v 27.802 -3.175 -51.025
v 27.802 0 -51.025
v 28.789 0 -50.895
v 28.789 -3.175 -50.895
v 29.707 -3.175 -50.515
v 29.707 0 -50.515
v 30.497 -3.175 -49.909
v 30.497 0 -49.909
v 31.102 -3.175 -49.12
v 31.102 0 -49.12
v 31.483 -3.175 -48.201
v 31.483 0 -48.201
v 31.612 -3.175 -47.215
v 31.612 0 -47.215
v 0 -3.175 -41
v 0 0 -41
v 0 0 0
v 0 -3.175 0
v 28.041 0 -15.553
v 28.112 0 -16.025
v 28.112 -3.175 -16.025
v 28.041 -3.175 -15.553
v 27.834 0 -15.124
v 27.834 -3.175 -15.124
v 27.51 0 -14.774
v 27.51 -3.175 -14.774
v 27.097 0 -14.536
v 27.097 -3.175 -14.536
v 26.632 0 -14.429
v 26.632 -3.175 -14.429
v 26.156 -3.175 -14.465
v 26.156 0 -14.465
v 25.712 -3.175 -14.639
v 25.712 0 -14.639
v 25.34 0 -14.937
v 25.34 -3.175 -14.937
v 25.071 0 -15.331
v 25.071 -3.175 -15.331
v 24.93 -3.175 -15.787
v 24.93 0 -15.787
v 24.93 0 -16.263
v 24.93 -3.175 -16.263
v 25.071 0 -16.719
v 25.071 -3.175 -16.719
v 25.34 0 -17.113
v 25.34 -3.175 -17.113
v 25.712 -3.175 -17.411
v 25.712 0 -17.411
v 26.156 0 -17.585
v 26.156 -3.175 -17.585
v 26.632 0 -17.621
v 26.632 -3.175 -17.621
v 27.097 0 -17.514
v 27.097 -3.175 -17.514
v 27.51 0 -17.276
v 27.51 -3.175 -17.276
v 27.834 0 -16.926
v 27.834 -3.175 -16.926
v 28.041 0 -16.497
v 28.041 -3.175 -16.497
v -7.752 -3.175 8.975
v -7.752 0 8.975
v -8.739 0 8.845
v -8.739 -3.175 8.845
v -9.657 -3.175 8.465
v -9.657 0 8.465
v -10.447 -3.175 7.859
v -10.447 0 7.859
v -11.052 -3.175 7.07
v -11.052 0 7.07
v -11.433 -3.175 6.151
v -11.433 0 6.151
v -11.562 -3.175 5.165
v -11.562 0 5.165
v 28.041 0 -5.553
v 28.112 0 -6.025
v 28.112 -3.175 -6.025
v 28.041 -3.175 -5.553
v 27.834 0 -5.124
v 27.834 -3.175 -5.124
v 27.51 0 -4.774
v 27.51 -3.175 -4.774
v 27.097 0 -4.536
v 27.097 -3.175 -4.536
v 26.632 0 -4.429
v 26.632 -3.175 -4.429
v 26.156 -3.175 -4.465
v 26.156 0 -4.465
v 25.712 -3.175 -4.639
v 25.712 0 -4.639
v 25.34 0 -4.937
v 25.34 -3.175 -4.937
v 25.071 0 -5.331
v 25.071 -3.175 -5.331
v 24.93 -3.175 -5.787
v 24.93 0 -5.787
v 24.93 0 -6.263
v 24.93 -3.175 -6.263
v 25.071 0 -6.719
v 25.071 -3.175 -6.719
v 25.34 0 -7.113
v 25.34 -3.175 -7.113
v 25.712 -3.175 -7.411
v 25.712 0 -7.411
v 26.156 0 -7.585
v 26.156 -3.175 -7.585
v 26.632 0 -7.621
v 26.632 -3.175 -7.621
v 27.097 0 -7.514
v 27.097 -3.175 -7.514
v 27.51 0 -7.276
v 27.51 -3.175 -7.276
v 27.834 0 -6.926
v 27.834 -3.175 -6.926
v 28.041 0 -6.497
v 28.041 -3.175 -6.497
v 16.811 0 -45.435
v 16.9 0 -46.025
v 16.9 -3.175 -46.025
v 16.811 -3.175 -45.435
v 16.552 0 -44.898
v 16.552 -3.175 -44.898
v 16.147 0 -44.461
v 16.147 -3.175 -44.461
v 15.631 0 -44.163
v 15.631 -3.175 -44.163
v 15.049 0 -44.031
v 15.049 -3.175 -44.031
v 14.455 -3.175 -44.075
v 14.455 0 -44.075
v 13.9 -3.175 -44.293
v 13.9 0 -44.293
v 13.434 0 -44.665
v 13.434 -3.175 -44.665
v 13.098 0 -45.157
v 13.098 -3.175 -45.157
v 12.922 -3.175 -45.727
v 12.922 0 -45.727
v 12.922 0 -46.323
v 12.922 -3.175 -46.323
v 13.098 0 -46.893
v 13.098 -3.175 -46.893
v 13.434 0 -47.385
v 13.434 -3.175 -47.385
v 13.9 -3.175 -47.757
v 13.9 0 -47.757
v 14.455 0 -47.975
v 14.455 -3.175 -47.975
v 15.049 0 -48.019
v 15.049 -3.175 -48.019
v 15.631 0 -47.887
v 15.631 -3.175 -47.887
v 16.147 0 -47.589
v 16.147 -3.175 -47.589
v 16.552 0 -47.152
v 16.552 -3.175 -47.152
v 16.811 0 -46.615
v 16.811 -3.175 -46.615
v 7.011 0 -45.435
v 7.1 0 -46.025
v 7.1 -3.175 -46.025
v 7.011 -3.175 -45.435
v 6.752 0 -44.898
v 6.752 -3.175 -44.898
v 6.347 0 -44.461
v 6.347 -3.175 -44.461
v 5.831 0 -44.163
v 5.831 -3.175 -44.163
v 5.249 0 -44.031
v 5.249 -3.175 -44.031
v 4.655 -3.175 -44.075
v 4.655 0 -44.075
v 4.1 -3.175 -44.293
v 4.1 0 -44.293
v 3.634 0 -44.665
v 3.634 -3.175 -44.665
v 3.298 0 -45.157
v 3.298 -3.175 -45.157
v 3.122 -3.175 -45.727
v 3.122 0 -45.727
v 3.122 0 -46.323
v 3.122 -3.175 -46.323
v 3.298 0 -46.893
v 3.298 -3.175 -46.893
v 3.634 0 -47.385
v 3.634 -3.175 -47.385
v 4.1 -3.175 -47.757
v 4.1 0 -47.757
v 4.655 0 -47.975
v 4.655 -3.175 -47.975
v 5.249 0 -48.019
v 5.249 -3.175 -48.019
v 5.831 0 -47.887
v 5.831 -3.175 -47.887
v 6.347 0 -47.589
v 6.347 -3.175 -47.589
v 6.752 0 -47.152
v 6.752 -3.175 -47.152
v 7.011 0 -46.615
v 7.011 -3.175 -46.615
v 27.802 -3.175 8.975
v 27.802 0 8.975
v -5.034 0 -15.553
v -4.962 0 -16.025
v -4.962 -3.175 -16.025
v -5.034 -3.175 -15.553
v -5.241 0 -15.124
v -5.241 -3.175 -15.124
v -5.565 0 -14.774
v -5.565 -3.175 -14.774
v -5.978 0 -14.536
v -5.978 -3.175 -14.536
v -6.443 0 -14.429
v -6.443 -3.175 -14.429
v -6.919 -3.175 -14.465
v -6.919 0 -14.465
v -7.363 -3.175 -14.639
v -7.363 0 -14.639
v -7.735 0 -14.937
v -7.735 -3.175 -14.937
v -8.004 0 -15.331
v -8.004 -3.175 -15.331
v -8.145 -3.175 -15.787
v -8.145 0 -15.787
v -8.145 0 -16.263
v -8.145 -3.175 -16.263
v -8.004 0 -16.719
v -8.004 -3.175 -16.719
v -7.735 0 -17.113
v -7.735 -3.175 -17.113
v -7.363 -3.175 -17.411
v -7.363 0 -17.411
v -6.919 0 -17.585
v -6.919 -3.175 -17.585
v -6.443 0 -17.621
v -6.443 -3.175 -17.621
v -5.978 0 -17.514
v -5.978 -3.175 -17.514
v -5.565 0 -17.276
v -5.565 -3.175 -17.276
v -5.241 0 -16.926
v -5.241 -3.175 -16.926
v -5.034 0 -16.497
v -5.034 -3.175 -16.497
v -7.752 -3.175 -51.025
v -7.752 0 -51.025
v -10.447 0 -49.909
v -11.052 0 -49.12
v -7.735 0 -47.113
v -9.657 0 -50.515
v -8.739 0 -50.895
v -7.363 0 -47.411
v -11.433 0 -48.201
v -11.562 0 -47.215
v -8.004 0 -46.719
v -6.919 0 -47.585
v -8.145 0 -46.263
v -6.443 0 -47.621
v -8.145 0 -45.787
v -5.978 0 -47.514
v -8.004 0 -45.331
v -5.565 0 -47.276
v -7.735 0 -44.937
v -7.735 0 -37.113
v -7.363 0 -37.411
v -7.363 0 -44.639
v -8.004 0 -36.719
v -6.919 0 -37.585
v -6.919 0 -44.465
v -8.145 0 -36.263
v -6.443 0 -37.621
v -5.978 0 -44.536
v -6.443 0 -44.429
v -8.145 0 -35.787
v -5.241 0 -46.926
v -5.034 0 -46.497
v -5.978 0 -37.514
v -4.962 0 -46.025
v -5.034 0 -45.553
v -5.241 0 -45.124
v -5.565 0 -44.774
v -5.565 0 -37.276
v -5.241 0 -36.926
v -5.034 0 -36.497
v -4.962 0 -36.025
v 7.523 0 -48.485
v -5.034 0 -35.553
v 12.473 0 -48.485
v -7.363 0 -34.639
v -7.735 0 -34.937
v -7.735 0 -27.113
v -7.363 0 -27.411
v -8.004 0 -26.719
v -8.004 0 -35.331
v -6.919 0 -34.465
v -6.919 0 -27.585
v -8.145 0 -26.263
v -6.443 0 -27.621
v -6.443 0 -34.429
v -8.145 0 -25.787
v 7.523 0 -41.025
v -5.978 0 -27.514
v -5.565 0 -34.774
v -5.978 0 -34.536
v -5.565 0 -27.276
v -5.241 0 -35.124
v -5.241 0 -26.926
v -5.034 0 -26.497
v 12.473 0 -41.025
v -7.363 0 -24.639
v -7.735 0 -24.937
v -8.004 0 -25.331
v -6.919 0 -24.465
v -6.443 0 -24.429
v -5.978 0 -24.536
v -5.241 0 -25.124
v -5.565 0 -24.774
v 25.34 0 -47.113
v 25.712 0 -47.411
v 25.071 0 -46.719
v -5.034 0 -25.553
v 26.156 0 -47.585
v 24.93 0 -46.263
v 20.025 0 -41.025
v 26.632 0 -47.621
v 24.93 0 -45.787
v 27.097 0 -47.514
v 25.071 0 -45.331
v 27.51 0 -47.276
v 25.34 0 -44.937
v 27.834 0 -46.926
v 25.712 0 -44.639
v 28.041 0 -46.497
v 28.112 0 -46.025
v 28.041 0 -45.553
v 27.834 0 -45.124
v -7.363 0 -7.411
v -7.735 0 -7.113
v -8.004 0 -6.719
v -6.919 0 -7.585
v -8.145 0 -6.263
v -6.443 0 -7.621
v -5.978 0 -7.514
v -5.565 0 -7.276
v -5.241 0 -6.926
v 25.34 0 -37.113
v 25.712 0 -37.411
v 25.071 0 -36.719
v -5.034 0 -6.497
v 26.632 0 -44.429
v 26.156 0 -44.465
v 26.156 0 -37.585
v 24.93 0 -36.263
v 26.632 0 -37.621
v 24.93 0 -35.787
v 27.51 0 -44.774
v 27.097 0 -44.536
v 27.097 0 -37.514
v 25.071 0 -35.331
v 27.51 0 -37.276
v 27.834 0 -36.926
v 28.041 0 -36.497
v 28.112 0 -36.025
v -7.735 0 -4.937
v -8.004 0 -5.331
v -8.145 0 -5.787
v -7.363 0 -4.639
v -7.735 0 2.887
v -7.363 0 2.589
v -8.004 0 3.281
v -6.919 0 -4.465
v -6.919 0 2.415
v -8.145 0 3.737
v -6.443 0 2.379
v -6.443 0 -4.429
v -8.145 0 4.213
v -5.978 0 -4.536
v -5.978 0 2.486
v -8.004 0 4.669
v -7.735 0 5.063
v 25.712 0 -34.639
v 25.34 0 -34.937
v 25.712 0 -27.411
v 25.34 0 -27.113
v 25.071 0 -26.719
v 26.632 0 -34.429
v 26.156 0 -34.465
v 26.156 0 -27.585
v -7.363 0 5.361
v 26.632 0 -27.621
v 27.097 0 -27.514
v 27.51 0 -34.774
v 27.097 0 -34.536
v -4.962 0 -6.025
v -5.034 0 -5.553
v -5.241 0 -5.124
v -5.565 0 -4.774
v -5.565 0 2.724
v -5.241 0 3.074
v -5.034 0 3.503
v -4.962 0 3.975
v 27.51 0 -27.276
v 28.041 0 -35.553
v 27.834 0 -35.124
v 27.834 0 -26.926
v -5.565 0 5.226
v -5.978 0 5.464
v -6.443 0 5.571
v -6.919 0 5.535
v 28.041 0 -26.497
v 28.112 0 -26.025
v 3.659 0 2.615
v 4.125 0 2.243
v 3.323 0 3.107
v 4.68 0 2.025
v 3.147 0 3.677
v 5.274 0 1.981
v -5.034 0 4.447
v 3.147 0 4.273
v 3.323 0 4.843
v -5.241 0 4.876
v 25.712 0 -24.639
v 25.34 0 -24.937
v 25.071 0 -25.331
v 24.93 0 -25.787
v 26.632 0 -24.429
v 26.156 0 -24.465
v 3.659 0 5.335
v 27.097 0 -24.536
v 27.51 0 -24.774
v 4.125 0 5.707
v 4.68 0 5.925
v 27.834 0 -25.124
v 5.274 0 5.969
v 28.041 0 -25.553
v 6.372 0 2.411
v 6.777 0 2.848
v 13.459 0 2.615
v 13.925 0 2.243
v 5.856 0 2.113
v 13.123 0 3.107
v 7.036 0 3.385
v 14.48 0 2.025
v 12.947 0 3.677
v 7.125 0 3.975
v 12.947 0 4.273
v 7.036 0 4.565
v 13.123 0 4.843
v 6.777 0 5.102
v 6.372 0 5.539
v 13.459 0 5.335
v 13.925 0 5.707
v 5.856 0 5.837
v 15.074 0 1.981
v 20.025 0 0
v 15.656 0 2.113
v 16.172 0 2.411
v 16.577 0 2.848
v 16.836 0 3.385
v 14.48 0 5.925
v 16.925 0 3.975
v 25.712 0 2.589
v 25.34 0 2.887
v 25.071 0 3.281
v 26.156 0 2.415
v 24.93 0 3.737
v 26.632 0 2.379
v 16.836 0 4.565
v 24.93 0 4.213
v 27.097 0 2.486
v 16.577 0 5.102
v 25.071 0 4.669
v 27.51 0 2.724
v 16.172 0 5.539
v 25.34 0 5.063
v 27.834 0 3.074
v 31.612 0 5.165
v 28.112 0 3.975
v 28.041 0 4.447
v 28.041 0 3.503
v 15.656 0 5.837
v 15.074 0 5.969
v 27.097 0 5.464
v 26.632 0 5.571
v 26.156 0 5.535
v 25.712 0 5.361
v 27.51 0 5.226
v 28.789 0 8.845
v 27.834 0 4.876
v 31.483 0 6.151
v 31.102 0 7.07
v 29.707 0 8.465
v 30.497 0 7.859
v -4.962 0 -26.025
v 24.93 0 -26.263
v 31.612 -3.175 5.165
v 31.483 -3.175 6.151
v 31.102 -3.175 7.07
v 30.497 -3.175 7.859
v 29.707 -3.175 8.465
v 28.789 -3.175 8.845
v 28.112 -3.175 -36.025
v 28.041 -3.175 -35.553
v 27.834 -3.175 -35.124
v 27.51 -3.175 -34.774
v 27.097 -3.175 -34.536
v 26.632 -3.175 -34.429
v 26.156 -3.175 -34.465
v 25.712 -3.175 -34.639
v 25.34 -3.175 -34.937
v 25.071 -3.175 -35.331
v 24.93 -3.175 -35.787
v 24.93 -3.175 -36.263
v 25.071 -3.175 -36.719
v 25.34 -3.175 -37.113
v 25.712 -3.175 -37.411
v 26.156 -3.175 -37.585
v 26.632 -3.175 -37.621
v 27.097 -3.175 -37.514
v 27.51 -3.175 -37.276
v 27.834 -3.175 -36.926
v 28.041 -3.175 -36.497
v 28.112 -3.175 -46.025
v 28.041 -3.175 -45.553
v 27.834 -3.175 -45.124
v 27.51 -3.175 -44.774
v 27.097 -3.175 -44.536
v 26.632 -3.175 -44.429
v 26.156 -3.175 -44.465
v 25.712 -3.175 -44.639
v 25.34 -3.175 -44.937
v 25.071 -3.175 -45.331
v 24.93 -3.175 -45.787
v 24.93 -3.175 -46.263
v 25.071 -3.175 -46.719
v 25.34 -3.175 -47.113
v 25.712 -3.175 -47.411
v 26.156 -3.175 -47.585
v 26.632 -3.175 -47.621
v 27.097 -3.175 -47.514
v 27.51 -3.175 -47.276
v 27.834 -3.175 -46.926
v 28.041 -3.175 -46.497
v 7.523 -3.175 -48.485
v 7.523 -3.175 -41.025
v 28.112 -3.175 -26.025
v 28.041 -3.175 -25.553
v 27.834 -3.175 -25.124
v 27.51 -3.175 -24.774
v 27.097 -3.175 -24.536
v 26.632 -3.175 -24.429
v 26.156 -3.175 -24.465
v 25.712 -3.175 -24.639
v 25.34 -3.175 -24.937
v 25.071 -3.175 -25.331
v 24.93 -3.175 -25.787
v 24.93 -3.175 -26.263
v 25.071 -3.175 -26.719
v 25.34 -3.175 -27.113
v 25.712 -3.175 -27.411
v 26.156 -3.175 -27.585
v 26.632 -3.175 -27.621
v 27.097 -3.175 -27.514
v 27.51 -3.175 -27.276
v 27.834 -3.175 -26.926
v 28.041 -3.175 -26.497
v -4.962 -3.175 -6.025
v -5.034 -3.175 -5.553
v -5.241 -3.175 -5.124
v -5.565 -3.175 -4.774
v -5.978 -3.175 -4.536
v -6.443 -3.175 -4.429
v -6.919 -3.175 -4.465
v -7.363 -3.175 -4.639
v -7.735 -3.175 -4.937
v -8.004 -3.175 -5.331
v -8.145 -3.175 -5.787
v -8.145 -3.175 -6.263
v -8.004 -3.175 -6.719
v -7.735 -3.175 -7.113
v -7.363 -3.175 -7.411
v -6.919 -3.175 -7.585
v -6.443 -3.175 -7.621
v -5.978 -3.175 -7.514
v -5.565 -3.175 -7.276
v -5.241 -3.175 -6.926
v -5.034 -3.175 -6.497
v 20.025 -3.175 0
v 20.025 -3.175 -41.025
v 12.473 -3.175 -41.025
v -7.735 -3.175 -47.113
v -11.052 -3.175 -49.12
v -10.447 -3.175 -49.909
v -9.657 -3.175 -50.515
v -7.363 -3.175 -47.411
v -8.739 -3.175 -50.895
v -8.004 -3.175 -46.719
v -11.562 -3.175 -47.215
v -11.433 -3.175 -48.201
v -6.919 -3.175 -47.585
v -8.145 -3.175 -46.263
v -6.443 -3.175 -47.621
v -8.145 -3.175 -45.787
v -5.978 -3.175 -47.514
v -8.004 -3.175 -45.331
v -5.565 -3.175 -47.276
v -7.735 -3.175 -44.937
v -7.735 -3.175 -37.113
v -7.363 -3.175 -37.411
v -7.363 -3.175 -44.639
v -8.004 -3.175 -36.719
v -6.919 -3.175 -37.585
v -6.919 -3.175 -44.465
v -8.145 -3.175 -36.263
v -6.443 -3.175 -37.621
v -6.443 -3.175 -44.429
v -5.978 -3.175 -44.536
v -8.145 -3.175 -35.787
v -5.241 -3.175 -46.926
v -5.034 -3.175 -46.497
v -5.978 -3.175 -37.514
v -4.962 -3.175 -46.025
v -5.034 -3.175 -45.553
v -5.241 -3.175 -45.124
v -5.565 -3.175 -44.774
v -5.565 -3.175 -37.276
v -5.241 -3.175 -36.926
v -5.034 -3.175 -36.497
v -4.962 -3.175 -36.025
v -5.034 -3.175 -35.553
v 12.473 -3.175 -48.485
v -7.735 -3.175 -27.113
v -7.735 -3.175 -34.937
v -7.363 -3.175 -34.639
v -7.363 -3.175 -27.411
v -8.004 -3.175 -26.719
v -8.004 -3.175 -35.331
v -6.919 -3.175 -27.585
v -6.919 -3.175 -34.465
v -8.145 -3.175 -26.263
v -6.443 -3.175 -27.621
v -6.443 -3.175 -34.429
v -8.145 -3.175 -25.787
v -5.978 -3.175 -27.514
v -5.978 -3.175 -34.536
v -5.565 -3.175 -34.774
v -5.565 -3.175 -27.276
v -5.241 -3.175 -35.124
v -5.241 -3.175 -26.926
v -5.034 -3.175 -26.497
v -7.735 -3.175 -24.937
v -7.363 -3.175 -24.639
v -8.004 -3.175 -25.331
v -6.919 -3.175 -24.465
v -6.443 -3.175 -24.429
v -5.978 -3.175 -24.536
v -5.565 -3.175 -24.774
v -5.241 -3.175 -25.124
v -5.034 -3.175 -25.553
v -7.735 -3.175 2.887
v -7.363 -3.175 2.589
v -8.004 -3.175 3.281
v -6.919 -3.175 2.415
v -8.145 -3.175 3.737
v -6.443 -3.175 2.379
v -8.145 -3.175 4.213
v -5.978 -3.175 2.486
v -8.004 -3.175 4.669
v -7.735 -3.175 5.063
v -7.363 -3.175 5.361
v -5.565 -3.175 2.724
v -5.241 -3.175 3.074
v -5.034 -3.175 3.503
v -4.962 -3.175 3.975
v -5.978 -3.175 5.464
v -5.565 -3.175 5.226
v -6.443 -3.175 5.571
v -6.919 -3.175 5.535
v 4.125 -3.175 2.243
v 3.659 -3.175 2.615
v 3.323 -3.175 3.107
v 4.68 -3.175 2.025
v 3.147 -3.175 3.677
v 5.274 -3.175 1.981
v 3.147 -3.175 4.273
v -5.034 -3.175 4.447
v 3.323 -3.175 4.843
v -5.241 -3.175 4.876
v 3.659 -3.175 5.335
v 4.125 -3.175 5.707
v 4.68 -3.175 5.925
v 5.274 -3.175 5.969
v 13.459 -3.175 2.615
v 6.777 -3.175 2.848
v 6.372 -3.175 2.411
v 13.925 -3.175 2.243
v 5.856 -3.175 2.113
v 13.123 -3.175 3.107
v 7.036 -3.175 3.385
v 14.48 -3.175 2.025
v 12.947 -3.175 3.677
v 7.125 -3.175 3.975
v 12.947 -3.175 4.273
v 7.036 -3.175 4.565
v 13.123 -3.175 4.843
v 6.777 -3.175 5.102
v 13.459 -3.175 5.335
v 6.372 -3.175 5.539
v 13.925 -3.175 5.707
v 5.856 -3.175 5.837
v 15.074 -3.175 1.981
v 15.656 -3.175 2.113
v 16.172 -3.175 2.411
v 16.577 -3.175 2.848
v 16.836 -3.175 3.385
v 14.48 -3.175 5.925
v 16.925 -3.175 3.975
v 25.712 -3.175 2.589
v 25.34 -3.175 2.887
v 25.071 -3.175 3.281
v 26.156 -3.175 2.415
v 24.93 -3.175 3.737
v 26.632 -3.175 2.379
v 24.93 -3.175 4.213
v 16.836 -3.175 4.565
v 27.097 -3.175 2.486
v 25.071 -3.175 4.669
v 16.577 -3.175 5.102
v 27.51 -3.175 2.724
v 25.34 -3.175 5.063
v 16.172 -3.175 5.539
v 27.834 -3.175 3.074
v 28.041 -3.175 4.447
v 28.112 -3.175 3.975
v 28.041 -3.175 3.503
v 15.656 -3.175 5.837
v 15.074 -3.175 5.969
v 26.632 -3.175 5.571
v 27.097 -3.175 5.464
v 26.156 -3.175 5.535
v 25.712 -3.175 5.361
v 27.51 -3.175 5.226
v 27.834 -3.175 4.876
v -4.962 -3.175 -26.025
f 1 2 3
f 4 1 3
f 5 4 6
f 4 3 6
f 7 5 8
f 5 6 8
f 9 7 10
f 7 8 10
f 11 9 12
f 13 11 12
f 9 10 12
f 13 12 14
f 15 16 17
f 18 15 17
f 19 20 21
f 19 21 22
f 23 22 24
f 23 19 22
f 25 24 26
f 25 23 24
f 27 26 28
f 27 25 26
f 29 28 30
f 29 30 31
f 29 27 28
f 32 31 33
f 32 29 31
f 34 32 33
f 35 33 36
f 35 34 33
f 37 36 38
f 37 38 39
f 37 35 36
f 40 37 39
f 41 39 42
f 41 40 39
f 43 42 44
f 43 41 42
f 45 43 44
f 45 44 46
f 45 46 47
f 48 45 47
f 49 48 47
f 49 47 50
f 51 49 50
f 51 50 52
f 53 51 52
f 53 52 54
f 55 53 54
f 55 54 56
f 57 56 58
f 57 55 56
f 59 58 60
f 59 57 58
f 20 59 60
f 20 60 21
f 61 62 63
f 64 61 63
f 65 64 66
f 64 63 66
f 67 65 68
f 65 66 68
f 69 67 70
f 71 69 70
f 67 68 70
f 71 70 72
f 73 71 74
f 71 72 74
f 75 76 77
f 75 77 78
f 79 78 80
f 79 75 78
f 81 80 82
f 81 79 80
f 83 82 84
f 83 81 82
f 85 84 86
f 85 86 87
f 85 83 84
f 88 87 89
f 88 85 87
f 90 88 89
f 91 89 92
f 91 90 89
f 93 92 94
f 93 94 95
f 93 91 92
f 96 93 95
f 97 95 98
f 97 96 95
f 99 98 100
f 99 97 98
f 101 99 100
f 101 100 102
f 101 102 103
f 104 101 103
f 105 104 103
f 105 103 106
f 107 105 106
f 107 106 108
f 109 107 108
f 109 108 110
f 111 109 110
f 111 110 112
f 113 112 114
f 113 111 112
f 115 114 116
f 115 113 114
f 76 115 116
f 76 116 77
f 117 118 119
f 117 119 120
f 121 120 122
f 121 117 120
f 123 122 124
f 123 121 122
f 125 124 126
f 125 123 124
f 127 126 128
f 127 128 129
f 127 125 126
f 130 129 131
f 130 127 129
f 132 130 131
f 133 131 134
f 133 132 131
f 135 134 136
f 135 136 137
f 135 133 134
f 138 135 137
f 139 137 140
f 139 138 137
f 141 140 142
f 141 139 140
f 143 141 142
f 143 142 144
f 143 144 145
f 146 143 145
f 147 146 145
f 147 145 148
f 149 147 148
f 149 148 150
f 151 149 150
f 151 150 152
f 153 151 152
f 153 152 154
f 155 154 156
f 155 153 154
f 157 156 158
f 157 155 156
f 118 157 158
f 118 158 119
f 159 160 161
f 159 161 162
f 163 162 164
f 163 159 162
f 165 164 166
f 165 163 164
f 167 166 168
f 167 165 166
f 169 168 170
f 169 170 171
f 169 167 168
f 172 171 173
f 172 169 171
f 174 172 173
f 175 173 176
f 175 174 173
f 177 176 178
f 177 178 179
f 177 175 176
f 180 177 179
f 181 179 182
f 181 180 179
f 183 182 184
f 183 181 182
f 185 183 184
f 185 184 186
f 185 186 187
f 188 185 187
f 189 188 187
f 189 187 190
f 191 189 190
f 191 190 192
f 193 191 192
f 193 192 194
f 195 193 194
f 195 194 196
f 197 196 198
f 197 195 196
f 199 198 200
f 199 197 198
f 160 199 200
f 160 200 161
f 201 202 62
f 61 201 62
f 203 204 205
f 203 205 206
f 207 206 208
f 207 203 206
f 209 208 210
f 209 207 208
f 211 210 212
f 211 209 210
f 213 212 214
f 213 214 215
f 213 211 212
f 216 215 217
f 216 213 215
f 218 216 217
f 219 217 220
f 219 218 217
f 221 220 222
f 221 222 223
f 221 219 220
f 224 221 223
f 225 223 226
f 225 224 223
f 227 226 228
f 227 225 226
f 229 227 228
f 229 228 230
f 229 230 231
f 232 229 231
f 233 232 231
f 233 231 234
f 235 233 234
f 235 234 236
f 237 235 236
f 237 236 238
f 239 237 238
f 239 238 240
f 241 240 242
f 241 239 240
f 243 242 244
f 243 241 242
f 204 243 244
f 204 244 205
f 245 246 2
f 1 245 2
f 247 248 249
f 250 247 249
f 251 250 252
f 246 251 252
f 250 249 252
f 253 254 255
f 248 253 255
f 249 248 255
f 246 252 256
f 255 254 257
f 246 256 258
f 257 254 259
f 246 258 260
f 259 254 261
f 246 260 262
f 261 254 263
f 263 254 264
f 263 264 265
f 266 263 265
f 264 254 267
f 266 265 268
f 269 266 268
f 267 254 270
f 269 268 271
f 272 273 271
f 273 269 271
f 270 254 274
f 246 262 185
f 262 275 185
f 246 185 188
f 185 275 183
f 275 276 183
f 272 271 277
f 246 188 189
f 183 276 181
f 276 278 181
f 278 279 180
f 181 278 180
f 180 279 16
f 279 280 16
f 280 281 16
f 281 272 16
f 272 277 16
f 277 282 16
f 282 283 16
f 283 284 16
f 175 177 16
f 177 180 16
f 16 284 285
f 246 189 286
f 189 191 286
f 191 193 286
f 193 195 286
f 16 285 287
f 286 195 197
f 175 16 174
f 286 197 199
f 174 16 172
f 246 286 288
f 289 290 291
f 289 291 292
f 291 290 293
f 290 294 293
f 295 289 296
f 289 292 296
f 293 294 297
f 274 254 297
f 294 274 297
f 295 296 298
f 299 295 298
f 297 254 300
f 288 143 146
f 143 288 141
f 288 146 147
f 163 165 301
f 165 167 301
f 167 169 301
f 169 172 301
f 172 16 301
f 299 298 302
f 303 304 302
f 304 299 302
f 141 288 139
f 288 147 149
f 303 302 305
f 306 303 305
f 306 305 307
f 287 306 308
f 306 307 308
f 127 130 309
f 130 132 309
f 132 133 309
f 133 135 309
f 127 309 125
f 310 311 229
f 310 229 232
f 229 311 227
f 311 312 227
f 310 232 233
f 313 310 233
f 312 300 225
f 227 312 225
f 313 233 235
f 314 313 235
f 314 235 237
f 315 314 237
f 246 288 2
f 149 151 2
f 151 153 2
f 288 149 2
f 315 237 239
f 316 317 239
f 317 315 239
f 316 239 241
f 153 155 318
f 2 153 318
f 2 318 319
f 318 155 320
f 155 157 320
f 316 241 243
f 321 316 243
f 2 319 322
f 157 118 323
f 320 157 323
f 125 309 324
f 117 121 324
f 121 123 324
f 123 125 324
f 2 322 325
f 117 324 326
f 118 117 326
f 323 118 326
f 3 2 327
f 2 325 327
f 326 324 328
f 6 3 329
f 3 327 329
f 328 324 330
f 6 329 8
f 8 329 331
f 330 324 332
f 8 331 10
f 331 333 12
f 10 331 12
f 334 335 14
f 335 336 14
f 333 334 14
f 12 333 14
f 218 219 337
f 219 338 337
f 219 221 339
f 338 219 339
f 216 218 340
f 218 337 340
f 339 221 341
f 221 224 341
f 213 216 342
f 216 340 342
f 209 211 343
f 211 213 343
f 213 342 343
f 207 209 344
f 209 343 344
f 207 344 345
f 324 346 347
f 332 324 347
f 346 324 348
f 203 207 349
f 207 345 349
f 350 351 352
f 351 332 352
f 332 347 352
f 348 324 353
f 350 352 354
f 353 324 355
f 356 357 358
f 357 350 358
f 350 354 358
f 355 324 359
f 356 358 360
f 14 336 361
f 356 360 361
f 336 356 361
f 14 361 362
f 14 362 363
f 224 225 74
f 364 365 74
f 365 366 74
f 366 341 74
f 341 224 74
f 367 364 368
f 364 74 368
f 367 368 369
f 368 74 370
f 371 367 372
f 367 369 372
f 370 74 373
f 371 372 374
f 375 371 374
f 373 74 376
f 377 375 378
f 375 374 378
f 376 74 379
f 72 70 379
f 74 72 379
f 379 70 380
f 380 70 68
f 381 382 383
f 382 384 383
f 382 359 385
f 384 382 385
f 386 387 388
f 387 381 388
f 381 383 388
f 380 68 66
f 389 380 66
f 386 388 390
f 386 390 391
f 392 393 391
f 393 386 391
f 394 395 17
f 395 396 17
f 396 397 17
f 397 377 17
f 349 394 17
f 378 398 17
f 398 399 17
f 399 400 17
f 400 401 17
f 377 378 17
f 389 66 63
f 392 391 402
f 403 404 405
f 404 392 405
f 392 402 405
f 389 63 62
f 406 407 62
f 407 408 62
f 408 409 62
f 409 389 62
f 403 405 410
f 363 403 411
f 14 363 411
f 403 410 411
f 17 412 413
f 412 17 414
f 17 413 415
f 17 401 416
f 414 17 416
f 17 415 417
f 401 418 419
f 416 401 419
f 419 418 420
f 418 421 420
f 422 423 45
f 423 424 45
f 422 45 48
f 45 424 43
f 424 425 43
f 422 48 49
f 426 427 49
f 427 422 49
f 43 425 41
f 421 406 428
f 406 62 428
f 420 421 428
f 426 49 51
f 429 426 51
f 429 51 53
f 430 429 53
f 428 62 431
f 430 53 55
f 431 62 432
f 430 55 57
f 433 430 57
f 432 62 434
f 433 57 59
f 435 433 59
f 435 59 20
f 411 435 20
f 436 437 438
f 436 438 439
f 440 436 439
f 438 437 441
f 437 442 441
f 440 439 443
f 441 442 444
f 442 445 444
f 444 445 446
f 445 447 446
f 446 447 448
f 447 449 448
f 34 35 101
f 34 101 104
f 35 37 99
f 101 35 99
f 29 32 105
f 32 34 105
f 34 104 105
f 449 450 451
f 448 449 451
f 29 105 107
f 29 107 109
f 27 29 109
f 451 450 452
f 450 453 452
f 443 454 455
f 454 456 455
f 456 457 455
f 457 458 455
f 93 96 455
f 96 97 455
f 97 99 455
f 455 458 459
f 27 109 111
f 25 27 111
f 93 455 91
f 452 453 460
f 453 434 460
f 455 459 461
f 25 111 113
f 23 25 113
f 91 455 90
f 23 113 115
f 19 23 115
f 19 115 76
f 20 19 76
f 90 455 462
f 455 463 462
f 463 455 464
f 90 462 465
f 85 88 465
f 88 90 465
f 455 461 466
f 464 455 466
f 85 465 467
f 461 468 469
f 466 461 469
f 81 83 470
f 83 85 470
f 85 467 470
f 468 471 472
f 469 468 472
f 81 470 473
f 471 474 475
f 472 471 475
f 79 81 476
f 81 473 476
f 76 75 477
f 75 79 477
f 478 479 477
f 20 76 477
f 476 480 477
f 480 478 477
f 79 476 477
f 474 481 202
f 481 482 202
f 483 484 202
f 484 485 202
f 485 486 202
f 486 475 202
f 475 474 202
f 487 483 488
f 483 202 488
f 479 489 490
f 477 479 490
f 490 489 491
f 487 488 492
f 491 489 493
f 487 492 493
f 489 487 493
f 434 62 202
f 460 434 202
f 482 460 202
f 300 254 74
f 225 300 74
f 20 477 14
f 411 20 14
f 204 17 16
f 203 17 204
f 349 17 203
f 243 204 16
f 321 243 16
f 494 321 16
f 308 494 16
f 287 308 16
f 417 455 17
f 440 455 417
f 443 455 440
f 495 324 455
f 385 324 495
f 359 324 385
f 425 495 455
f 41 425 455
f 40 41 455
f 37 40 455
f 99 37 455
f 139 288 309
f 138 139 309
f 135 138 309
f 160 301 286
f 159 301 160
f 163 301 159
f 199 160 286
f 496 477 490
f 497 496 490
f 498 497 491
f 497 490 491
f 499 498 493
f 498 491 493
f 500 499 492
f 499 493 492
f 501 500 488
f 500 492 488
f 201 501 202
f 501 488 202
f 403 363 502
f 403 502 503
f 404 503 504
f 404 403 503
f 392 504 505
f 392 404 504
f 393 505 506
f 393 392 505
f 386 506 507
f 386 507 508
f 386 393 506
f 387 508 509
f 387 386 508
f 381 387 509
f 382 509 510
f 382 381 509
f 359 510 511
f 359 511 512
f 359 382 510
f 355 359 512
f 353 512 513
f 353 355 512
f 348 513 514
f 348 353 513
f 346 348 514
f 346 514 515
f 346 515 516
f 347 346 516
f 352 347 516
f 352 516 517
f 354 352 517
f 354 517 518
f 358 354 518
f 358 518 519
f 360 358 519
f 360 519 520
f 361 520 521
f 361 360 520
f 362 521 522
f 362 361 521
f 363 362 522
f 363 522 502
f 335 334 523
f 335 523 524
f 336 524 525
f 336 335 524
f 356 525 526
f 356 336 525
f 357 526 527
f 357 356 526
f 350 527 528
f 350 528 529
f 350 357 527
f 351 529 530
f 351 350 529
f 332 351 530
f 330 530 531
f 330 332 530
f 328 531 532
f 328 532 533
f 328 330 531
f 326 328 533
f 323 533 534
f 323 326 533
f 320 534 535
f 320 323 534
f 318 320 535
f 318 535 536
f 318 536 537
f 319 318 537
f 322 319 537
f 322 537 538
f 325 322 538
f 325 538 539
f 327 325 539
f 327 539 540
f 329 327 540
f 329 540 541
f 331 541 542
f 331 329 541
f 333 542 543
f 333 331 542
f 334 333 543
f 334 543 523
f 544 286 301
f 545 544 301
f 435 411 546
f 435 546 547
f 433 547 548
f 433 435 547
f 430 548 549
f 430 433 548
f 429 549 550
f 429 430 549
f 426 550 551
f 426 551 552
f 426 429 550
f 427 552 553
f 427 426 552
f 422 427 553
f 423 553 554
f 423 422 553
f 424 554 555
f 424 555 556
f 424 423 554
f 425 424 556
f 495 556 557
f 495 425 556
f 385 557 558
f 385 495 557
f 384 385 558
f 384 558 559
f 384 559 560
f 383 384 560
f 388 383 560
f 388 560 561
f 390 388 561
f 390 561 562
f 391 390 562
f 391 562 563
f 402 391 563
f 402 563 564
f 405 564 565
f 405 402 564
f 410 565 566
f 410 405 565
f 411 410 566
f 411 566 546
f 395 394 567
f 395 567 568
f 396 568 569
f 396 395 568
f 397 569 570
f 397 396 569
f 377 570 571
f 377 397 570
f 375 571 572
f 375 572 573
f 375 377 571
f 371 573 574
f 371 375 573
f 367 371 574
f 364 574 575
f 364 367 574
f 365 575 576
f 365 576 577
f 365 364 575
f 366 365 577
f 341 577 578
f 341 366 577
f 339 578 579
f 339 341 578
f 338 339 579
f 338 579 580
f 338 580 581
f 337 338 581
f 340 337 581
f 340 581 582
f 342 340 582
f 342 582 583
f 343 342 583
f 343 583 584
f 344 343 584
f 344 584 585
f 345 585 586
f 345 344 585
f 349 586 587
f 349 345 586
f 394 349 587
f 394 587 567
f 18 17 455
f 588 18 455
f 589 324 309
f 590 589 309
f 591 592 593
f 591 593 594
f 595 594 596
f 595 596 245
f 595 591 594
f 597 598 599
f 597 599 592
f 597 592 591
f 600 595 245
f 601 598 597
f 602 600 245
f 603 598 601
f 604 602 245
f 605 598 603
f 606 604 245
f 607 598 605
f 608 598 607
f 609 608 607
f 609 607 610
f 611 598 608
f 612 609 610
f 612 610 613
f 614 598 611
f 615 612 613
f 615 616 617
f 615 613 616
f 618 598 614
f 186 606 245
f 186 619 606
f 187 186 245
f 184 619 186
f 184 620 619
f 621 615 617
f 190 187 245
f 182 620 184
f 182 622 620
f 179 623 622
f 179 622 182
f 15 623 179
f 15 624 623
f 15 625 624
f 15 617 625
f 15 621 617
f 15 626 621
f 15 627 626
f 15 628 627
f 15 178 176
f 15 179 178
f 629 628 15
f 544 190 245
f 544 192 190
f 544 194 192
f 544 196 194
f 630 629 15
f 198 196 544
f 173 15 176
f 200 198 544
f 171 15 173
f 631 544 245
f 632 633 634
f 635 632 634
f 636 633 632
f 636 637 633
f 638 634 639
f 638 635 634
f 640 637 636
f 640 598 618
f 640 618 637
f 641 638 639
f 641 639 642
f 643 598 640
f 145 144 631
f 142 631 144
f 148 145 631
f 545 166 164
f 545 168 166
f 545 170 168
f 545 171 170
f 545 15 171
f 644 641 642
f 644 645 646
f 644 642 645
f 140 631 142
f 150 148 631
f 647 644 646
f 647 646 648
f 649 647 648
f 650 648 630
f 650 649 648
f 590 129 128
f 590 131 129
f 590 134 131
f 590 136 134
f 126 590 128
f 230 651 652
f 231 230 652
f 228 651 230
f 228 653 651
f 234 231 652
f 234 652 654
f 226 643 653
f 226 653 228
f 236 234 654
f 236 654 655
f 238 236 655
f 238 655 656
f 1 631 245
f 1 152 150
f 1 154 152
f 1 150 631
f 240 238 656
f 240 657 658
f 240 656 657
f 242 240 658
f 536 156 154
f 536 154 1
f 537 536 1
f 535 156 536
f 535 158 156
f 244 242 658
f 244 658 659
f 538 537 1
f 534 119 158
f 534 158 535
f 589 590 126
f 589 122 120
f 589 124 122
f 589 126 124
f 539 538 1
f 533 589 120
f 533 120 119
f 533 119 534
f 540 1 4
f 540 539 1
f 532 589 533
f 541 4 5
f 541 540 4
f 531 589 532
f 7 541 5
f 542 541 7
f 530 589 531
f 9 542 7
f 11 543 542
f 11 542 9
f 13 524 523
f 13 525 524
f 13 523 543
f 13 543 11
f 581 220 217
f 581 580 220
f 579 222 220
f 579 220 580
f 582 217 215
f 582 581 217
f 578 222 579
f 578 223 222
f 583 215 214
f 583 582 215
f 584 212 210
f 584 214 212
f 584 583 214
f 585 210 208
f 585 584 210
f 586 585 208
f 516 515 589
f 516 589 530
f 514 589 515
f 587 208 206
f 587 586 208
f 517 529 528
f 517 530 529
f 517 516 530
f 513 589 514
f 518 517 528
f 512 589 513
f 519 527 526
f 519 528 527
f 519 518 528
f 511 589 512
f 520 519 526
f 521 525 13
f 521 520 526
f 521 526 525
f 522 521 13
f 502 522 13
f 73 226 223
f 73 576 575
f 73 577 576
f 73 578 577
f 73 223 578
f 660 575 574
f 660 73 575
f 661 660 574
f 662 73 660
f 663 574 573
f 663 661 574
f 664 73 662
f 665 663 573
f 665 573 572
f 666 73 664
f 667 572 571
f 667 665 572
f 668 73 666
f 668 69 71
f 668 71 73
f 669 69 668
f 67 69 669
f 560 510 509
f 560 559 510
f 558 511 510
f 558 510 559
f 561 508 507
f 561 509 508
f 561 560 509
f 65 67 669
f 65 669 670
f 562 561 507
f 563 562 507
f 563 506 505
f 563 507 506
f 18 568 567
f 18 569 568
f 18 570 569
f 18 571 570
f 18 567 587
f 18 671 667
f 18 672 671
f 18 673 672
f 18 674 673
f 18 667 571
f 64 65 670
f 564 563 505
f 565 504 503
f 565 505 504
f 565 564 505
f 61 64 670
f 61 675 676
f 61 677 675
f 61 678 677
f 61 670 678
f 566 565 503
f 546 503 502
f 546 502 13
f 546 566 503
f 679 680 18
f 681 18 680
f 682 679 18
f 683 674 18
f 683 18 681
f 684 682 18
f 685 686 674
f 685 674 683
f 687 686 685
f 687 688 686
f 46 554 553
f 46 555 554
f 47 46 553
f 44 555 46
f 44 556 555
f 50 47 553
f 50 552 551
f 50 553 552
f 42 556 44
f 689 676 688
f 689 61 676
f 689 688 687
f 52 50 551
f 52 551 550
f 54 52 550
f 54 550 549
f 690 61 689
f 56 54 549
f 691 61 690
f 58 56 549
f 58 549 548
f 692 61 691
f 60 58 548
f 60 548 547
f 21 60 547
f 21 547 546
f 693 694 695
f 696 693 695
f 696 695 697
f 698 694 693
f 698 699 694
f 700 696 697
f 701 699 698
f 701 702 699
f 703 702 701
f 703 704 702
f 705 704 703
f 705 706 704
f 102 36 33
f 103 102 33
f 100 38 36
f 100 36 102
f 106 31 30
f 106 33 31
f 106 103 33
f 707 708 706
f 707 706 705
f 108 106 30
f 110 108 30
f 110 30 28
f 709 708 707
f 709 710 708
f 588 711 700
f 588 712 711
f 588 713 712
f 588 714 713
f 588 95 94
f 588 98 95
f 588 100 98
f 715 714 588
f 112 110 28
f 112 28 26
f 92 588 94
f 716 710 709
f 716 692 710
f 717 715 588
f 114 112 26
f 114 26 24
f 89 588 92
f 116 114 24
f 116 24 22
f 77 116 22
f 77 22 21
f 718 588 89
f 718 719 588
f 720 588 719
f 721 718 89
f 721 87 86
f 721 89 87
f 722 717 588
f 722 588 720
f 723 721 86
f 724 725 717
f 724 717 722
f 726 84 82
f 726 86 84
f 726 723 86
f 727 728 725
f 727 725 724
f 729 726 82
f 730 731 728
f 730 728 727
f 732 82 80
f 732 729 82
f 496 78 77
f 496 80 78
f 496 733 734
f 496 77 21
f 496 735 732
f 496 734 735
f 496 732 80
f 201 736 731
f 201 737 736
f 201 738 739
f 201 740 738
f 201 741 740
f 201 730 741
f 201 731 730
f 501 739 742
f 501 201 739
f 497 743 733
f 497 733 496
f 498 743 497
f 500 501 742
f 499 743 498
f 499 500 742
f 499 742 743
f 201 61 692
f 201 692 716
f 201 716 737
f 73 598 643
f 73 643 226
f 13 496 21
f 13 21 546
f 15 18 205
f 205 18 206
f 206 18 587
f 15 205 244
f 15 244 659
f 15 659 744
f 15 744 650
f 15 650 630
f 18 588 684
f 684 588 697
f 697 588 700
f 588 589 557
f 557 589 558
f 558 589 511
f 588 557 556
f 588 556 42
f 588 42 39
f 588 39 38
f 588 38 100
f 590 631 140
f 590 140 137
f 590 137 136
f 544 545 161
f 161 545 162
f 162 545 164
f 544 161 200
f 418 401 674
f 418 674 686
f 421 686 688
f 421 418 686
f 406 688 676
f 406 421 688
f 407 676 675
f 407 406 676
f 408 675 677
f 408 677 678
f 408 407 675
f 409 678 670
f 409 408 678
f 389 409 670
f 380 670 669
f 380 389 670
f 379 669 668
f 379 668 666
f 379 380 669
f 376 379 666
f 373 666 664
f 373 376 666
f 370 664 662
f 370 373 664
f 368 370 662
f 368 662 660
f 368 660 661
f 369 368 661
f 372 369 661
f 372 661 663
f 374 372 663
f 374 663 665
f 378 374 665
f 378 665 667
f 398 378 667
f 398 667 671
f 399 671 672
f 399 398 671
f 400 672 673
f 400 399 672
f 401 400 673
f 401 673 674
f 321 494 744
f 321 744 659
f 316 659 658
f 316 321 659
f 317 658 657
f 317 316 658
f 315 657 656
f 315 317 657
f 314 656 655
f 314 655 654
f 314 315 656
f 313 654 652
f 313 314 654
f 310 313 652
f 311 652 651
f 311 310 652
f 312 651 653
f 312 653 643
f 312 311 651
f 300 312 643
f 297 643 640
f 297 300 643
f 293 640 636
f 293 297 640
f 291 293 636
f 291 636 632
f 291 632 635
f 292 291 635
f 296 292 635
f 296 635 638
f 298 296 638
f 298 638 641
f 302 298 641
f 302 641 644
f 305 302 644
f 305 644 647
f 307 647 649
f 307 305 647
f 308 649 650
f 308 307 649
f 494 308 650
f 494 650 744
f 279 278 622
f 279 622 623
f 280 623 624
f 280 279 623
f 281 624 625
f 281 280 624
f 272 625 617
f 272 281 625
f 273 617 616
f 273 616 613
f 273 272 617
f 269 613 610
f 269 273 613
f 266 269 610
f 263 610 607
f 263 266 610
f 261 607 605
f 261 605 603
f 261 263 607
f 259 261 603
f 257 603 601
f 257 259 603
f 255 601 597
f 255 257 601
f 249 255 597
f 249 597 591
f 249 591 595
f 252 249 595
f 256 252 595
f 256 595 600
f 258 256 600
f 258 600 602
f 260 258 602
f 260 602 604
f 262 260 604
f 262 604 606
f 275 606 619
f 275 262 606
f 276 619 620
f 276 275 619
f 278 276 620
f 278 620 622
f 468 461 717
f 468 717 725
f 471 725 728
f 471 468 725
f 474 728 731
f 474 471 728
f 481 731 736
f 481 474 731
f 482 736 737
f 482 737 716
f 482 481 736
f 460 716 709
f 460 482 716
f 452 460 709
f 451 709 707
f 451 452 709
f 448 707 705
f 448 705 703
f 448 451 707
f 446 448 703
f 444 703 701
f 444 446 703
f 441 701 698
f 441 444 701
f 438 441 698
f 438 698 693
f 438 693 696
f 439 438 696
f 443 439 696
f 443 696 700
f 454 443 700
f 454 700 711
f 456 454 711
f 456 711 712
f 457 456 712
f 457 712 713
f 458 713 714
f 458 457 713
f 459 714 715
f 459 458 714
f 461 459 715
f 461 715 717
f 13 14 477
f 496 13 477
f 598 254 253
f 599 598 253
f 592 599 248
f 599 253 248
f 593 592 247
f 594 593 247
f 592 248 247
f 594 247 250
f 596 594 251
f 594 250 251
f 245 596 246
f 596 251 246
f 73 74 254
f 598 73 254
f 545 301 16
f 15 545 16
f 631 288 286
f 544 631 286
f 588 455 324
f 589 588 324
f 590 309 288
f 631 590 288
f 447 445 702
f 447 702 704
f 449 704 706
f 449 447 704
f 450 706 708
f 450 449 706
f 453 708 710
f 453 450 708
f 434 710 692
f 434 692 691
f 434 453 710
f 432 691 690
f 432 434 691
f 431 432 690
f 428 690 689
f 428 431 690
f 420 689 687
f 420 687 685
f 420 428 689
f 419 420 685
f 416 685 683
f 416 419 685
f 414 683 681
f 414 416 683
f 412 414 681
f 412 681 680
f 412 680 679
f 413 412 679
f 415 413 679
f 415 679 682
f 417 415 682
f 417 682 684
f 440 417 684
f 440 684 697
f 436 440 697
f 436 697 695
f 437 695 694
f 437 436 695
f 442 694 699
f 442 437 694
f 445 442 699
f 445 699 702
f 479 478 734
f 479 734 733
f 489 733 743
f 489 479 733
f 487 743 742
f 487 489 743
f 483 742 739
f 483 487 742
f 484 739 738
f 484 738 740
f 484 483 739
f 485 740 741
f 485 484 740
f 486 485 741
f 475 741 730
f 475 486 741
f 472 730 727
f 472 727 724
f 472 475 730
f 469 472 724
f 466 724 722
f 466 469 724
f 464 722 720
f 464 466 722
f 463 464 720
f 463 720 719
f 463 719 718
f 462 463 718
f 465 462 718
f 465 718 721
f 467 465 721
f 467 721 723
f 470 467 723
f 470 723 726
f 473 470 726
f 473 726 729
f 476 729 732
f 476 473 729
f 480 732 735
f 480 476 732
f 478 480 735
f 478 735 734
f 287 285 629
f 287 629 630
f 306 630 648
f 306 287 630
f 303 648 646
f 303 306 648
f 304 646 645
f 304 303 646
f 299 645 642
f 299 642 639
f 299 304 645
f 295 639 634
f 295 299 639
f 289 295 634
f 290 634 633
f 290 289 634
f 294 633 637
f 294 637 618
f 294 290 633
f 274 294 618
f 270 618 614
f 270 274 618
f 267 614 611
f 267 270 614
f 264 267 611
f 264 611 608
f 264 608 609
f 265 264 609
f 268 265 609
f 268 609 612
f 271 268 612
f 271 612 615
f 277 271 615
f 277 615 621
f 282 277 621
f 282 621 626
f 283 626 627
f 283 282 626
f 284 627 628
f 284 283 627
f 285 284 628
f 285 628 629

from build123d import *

# Parameters (mm, degrees)
F0_R     = 1.6
F0_R_2   = 2
F1_DEPTH = 3.175


# Not quite as in the source:
# - a length typed as a fraction of an inch, garbled in the dataset ("3 / 203.2 mm" for 3/8 in), is restored


with BuildPart() as f1:
    # F0 (on Front) → F1 (new body)
    with BuildSketch(Plane.XZ):
        with BuildLine():
            Line((27.8025, 8.975), (-7.7525, 8.975))
            ThreePointArc((-7.7525, 8.975), (-10.4465768363, 7.8590768363), (-11.5625, 5.165))
            Line((-11.5625, 5.165), (-11.5625, -47.215))
            ThreePointArc((-11.5625, -47.215), (-10.4465768363, -49.9090768363), (-7.7525, -51.025))
            Line((-7.7525, -51.025), (27.8025, -51.025))
            ThreePointArc((27.8025, -51.025), (30.4965768363, -49.9090768363), (31.6125, -47.215))
            Line((31.6125, -47.215), (31.6125, 5.165))
            ThreePointArc((31.6125, 5.165), (30.4965768363, 7.8590768363), (27.8025, 8.975))
        make_face()
        with Locations((-6.5625, -46.025)):
            Circle(F0_R, mode=Mode.SUBTRACT)
        with Locations((5.1, -46.025)):
            Circle(F0_R_2, mode=Mode.SUBTRACT)
        with Locations((-6.5625, -36.025)):
            Circle(F0_R, mode=Mode.SUBTRACT)
        with Locations((-6.5625, -26.025)):
            Circle(F0_R, mode=Mode.SUBTRACT)
        Polygon((0, -41), (0, 0), (20.025, 0), (20.025, -41.025), (12.4728614733, -41.025), (12.4728614733, -48.485), (7.5228614733, -48.485), (7.5228614733, -41.025), align=None, mode=Mode.SUBTRACT)
        with Locations((14.9, -46.025)):
            Circle(F0_R_2, mode=Mode.SUBTRACT)
        with Locations((26.5125, -46.025)):
            Circle(F0_R, mode=Mode.SUBTRACT)
        with Locations((26.5125, -36.025)):
            Circle(F0_R, mode=Mode.SUBTRACT)
        with Locations((26.5125, -26.025)):
            Circle(F0_R, mode=Mode.SUBTRACT)
        with Locations((-6.5625, -16.025)):
            Circle(F0_R, mode=Mode.SUBTRACT)
        with Locations((-6.5625, -6.025)):
            Circle(F0_R, mode=Mode.SUBTRACT)
        with Locations((-6.5625, 3.975)):
            Circle(F0_R, mode=Mode.SUBTRACT)
        with Locations((5.125, 3.975)):
            Circle(F0_R_2, mode=Mode.SUBTRACT)
        with Locations((26.5125, -16.025)):
            Circle(F0_R, mode=Mode.SUBTRACT)
        with Locations((14.925, 3.975)):
            Circle(F0_R_2, mode=Mode.SUBTRACT)
        with Locations((26.5125, -6.025)):
            Circle(F0_R, mode=Mode.SUBTRACT)
        with Locations((26.5125, 3.975)):
            Circle(F0_R, mode=Mode.SUBTRACT)
    extrude(amount=F1_DEPTH)


solid = f1.part
